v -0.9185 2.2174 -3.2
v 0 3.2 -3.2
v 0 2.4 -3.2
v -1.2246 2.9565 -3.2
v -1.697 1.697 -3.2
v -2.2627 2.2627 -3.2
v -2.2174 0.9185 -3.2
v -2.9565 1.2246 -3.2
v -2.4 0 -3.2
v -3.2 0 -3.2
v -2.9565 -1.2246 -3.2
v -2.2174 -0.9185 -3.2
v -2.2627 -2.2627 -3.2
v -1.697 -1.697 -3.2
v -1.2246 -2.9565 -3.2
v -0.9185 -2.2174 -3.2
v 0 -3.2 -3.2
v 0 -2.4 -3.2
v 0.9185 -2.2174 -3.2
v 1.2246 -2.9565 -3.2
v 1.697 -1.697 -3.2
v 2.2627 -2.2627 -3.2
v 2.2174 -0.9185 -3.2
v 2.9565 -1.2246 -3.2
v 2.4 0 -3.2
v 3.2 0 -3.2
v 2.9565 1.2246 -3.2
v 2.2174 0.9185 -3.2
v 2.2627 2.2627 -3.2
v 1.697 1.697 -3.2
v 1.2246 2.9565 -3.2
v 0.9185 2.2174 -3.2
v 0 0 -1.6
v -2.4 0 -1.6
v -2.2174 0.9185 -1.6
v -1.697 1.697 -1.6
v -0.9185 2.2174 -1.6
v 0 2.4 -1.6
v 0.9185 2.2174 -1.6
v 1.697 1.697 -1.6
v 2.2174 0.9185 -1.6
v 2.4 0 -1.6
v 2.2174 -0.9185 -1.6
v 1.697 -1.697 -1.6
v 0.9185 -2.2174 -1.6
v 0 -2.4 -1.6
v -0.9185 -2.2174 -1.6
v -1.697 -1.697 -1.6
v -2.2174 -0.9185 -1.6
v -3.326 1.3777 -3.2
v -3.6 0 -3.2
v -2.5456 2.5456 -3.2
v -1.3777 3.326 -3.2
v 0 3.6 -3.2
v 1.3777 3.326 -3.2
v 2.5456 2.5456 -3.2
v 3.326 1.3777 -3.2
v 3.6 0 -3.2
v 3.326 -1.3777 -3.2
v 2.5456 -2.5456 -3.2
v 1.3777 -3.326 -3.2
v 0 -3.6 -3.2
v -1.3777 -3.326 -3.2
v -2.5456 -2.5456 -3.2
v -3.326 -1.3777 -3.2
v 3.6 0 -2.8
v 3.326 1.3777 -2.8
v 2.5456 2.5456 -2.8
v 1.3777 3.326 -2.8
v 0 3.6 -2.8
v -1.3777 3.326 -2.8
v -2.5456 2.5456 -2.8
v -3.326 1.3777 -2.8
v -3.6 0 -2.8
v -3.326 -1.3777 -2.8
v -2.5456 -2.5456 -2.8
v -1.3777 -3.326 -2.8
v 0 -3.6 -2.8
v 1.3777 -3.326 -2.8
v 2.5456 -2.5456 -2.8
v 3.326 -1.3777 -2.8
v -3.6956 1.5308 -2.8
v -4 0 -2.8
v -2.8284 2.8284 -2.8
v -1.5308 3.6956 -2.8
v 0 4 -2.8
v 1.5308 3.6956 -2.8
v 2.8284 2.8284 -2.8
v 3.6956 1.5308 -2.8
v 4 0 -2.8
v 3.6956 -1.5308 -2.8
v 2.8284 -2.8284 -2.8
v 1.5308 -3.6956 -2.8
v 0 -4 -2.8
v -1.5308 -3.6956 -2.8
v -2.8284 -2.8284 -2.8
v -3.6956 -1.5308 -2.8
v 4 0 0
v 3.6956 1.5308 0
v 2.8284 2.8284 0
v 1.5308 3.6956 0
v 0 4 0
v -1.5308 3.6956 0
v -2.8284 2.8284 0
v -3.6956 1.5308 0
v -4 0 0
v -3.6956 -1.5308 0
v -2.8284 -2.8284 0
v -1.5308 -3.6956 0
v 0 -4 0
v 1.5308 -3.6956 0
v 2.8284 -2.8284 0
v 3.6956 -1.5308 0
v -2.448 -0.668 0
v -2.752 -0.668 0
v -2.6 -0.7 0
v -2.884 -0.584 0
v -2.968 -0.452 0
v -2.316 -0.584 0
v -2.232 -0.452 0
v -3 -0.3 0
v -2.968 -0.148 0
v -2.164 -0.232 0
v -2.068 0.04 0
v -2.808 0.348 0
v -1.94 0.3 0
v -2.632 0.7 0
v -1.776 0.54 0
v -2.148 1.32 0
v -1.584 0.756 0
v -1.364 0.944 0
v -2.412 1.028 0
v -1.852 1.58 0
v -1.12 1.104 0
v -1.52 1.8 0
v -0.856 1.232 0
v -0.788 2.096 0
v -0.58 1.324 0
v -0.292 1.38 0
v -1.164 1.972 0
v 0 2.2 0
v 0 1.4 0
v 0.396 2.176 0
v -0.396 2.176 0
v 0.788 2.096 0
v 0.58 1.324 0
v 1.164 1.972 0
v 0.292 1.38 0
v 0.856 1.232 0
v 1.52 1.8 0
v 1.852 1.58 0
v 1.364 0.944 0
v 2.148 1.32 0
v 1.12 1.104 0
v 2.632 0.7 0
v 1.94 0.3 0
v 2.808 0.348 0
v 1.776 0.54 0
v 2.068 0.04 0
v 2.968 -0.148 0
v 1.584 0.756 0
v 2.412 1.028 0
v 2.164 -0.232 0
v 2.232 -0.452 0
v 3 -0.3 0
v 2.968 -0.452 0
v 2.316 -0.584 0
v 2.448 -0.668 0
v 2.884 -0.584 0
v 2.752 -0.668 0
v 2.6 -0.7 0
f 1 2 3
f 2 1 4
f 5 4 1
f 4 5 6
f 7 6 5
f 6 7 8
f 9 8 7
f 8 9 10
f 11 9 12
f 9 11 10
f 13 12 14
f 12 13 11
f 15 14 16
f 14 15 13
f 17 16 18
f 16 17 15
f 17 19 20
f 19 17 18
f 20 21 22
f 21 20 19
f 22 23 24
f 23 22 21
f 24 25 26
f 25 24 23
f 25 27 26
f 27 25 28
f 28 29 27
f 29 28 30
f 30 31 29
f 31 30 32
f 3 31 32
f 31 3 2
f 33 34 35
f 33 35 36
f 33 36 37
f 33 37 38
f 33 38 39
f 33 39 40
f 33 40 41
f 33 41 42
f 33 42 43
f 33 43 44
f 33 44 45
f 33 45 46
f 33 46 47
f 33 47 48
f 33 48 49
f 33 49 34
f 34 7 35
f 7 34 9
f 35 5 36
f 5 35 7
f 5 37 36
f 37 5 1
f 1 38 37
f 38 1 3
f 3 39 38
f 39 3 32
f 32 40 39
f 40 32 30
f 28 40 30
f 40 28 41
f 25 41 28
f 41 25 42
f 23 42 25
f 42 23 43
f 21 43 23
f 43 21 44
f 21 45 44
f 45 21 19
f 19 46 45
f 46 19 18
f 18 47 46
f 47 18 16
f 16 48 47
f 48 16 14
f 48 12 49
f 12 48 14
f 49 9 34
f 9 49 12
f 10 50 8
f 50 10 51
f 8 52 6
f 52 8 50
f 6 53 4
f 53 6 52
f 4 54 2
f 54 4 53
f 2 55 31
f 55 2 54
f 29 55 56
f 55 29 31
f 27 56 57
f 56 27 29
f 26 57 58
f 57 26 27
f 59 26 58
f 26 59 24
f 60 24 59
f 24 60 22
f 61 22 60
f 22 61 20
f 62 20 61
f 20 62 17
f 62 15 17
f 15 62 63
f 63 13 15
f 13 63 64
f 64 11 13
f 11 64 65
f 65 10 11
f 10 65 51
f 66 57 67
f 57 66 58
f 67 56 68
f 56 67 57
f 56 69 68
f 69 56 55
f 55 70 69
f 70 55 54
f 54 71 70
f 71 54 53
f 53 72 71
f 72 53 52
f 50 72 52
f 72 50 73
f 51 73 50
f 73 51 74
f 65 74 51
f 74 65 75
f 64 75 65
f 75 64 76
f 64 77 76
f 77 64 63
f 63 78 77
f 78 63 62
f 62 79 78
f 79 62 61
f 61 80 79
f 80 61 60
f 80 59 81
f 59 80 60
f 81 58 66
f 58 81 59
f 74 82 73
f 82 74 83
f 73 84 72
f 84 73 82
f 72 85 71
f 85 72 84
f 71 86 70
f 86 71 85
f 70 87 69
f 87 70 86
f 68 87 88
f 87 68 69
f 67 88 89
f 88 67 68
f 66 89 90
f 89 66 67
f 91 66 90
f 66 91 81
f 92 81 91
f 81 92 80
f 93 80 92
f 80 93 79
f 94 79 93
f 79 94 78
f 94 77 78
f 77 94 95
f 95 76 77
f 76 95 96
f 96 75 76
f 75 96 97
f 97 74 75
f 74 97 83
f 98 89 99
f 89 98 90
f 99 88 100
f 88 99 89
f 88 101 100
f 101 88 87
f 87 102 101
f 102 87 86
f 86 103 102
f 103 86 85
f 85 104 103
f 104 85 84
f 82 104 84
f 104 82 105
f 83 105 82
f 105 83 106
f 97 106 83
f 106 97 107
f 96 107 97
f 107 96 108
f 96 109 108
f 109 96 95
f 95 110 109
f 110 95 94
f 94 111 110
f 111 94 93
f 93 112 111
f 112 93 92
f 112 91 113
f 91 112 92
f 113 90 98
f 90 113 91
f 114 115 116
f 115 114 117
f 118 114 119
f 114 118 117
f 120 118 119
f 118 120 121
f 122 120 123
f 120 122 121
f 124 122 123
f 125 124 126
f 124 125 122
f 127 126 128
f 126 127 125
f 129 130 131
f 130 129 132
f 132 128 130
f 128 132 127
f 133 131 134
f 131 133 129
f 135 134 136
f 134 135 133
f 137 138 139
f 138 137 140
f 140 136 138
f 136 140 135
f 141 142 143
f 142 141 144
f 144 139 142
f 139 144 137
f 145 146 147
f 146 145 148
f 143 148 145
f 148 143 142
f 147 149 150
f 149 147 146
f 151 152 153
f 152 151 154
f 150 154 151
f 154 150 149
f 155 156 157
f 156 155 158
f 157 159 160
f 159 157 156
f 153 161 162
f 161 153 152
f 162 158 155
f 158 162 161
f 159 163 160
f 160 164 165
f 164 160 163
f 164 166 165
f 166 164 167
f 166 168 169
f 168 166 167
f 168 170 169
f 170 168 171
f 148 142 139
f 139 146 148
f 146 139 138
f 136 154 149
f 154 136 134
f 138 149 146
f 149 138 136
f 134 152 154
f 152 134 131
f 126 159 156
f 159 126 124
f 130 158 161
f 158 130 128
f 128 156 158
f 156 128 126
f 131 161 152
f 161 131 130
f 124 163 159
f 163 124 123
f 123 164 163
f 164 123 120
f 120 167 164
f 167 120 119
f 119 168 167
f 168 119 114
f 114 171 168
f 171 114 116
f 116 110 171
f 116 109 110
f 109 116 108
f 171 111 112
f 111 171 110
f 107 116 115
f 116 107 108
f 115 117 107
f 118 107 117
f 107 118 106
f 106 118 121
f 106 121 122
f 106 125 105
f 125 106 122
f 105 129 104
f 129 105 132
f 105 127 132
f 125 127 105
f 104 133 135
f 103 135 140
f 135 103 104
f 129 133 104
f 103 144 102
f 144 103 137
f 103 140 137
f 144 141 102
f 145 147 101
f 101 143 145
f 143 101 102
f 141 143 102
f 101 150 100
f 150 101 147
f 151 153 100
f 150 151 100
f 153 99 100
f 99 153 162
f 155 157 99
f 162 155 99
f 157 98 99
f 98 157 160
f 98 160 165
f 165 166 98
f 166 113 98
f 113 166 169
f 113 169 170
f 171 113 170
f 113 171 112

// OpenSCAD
// file: ../p/4-4disc.scad
use <../lib.scad>
function ldraw_lib__4_4disc() = [
// 0 Disc 1.0
// 0 Name: 4-4disc.dat
// 0 Author: James Jessiman
// 0 !LDRAW_ORG Primitive UPDATE 2002-02
// 0 !LICENSE Licensed under CC BY 2.0 and CC BY 4.0 : see CAreadme.txt
// 
// 0 BFC CERTIFY CCW
  [0,"BFC","CERTIFY"],
  [0,"BFC","CCW"],
// 
// 0 !HISTORY 1998-12-15 [PTadmin] Official Update 1998-10
// 0 !HISTORY 2002-03-23 [sbliss] Added BFC statement
// 0 !HISTORY 2002-04-25 [PTadmin] Official Update 2002-02
// 0 !HISTORY 2007-06-24 [PTadmin] Header formatted for Contributor Agreement
// 0 !HISTORY 2008-07-01 [PTadmin] Official Update 2008-01
// 
// 
// 3 16 0 0 0 1 0 0 0.9239 0 0.3827
  [3,16,0,0,0,1,0,0,0.9239,0,0.3827],
// 3 16 0 0 0 0.9239 0 0.3827 0.7071 0 0.7071
  [3,16,0,0,0,0.9239,0,0.3827,0.7071,0,0.7071],
// 3 16 0 0 0 0.7071 0 0.7071 0.3827 0 0.9239
  [3,16,0,0,0,0.7071,0,0.7071,0.3827,0,0.9239],
// 3 16 0 0 0 0.3827 0 0.9239 0 0 1
  [3,16,0,0,0,0.3827,0,0.9239,0,0,1],
// 3 16 0 0 0 0 0 1 -0.3827 0 0.9239
  [3,16,0,0,0,0,0,1,-0.3827,0,0.9239],
// 3 16 0 0 0 -0.3827 0 0.9239 -0.7071 0 0.7071
  [3,16,0,0,0,-0.3827,0,0.9239,-0.7071,0,0.7071],
// 3 16 0 0 0 -0.7071 0 0.7071 -0.9239 0 0.3827
  [3,16,0,0,0,-0.7071,0,0.7071,-0.9239,0,0.3827],
// 3 16 0 0 0 -0.9239 0 0.3827 -1 0 -0
  [3,16,0,0,0,-0.9239,0,0.3827,-1,0,-0],
// 3 16 0 0 0 -1 0 -0 -0.9239 0 -0.3827
  [3,16,0,0,0,-1,0,-0,-0.9239,0,-0.3827],
// 3 16 0 0 0 -0.9239 0 -0.3827 -0.7071 0 -0.7071
  [3,16,0,0,0,-0.9239,0,-0.3827,-0.7071,0,-0.7071],
// 3 16 0 0 0 -0.7071 0 -0.7071 -0.3827 0 -0.9239
  [3,16,0,0,0,-0.7071,0,-0.7071,-0.3827,0,-0.9239],
// 3 16 0 0 0 -0.3827 0 -0.9239 0 0 -1
  [3,16,0,0,0,-0.3827,0,-0.9239,0,0,-1],
// 3 16 0 0 0 0 0 -1 0.3827 0 -0.9239
  [3,16,0,0,0,0,0,-1,0.3827,0,-0.9239],
// 3 16 0 0 0 0.3827 0 -0.9239 0.7071 0 -0.7071
  [3,16,0,0,0,0.3827,0,-0.9239,0.7071,0,-0.7071],
// 3 16 0 0 0 0.7071 0 -0.7071 0.9239 0 -0.3827
  [3,16,0,0,0,0.7071,0,-0.7071,0.9239,0,-0.3827],
// 3 16 0 0 0 0.9239 0 -0.3827 1 0 0
  [3,16,0,0,0,0.9239,0,-0.3827,1,0,0],
// 0
];
module ldraw_lib__4_4disc(step=0, col=false, unit=2/5, alt=false, line=0.2, solid=!$preview)
    makepoly(ldraw_lib__4_4disc(), step=step, col=col, unit=unit, alt=alt, line=line, solid=solid);
ldraw_lib__4_4disc(line=0.2);
// file: ../p/4-4ring3.scad
use <../lib.scad>
$fa=1; $fs=0.2;
function ldraw_lib__4_4ring3(realsolid=false) = [
// 0 Ring  3 x 1.0
// 0 Name: 4-4ring3.dat
// 0 Author: James Jessiman
// 0 !LDRAW_ORG Primitive UPDATE 2009-01
// 0 !LICENSE Licensed under CC BY 2.0 and CC BY 4.0 : see CAreadme.txt
// 
// 0 BFC CERTIFY CCW
  [0,"BFC","CERTIFY"],
  [0,"BFC","CCW"],
// 
// 0 !HISTORY 1998-12-15 [PTadmin] Official Update 1998-10
// 0 !HISTORY 2002-04-05 [hafhead] Added BFC statement
// 0 !HISTORY 2002-04-25 [PTadmin] Official Update 2002-02
// 0 !HISTORY 2007-06-24 [PTadmin] Header formatted for Contributor Agreement
// 0 !HISTORY 2008-07-01 [PTadmin] Official Update 2008-01
// 0 !HISTORY 2008-08-26 [cwdee] Switch polygon winding and rename
// 0 !HISTORY 2009-05-02 [PTadmin] Official Update 2009-01
// 
// 
// 4 16 -1.5308 0 3.6956 -1.1481 0 2.7717 0 0 3 0 0 4
  [4,16,-1.5308,0,3.6956,-1.1481,0,2.7717,0,0,3,0,0,4],
// 4 16 -2.8284 0 2.8284 -2.1213 0 2.1213 -1.1481 0 2.7717 -1.5308 0 3.6956
  [4,16,-2.8284,0,2.8284,-2.1213,0,2.1213,-1.1481,0,2.7717,-1.5308,0,3.6956],
// 4 16 -3.6956 0 1.5308 -2.7717 0 1.1481 -2.1213 0 2.1213 -2.8284 0 2.8284
  [4,16,-3.6956,0,1.5308,-2.7717,0,1.1481,-2.1213,0,2.1213,-2.8284,0,2.8284],
// 4 16 -4 0 0 -3 0 0 -2.7717 0 1.1481 -3.6956 0 1.5308
  [4,16,-4,0,0,-3,0,0,-2.7717,0,1.1481,-3.6956,0,1.5308],
// 4 16 -3.6956 0 -1.5308 -2.7717 0 -1.1481 -3 0 0 -4 0 0
  [4,16,-3.6956,0,-1.5308,-2.7717,0,-1.1481,-3,0,0,-4,0,0],
// 4 16 -2.8284 0 -2.8284 -2.1213 0 -2.1213 -2.7717 0 -1.1481 -3.6956 0 -1.5308
  [4,16,-2.8284,0,-2.8284,-2.1213,0,-2.1213,-2.7717,0,-1.1481,-3.6956,0,-1.5308],
// 4 16 -1.5308 0 -3.6956 -1.1481 0 -2.7717 -2.1213 0 -2.1213 -2.8284 0 -2.8284
  [4,16,-1.5308,0,-3.6956,-1.1481,0,-2.7717,-2.1213,0,-2.1213,-2.8284,0,-2.8284],
// 4 16 0 0 -4 0 0 -3 -1.1481 0 -2.7717 -1.5308 0 -3.6956
  [4,16,0,0,-4,0,0,-3,-1.1481,0,-2.7717,-1.5308,0,-3.6956],
// 4 16 1.5308 0 -3.6956 1.1481 0 -2.7717 0 0 -3 0 0 -4
  [4,16,1.5308,0,-3.6956,1.1481,0,-2.7717,0,0,-3,0,0,-4],
// 4 16 2.8284 0 -2.8284 2.1213 0 -2.1213 1.1481 0 -2.7717 1.5308 0 -3.6956
  [4,16,2.8284,0,-2.8284,2.1213,0,-2.1213,1.1481,0,-2.7717,1.5308,0,-3.6956],
// 4 16 3.6956 0 -1.5308 2.7717 0 -1.1481 2.1213 0 -2.1213 2.8284 0 -2.8284
  [4,16,3.6956,0,-1.5308,2.7717,0,-1.1481,2.1213,0,-2.1213,2.8284,0,-2.8284],
// 4 16 4 0 0 3 0 0 2.7717 0 -1.1481 3.6956 0 -1.5308
  [4,16,4,0,0,3,0,0,2.7717,0,-1.1481,3.6956,0,-1.5308],
// 4 16 3.6956 0 1.5308 2.7717 0 1.1481 3 0 0 4 0 0
  [4,16,3.6956,0,1.5308,2.7717,0,1.1481,3,0,0,4,0,0],
// 4 16 2.8284 0 2.8284 2.1213 0 2.1213 2.7717 0 1.1481 3.6956 0 1.5308
  [4,16,2.8284,0,2.8284,2.1213,0,2.1213,2.7717,0,1.1481,3.6956,0,1.5308],
// 4 16 1.5308 0 3.6956 1.1481 0 2.7717 2.1213 0 2.1213 2.8284 0 2.8284
  [4,16,1.5308,0,3.6956,1.1481,0,2.7717,2.1213,0,2.1213,2.8284,0,2.8284],
// 4 16 0 0 4 0 0 3 1.1481 0 2.7717 1.5308 0 3.6956
  [4,16,0,0,4,0,0,3,1.1481,0,2.7717,1.5308,0,3.6956],
// 0
];
module ldraw_lib__4_4ring3(step=0, col=false, unit=2/5, alt=false, line=0.2, solid=!$preview)
    makepoly(ldraw_lib__4_4ring3(solid), step=step, col=col, unit=unit, alt=alt, line=line, solid=solid);
ldraw_lib__4_4ring3(line=0.2);
// file: ../p/4-4cylc.scad
use <../lib.scad>
use <4-4cyli.scad>
use <4-4disc.scad>
use <4-4edge.scad>
function ldraw_lib__4_4cylc() = [
// 0 Cylinder Closed 1.0
// 0 Name: 4-4cylc.dat
// 0 Author: Alex Taylor [anathema]
// 0 !LDRAW_ORG Primitive UPDATE 2009-02
// 0 !LICENSE Licensed under CC BY 4.0 : see CAreadme.txt
// 
// 0 BFC CERTIFY CCW
  [0,"BFC","CERTIFY"],
  [0,"BFC","CCW"],
// 
// 0 !HISTORY 2008-12-29 [cwdee] Removed one disc
// 0 !HISTORY 2009-09-03 [PTadmin] Official Update 2009-02
// 
// 
// 1 16 0 0 0 1 0 0 0 1 0 0 0 1 4-4edge.dat
  [1,16,0,0,0,1,0,0,0,1,0,0,0,1, ldraw_lib__4_4edge()],
// 1 16 0 1 0 1 0 0 0 1 0 0 0 1 4-4edge.dat
  [1,16,0,1,0,1,0,0,0,1,0,0,0,1, ldraw_lib__4_4edge()],
// 1 16 0 0 0 1 0 0 0 1 0 0 0 1 4-4disc.dat
  [1,16,0,0,0,1,0,0,0,1,0,0,0,1, ldraw_lib__4_4disc()],
// 1 16 0 0 0 1 0 0 0 1 0 0 0 1 4-4cyli.dat
  [1,16,0,0,0,1,0,0,0,1,0,0,0,1, ldraw_lib__4_4cyli()],
// 0
];
module ldraw_lib__4_4cylc(step=0, col=false, unit=2/5, alt=false, line=0.2, solid=!$preview)
    makepoly(ldraw_lib__4_4cylc(), step=step, col=col, unit=unit, alt=alt, line=line, solid=solid);
ldraw_lib__4_4cylc(line=0.2);
// file: ../p/4-4edge.scad
use <../lib.scad>
function ldraw_lib__4_4edge() = [
// 0 Circle 1.0
// 0 Name: 4-4edge.dat
// 0 Author: James Jessiman
// 0 !LDRAW_ORG Primitive UPDATE 2017-01
// 0 !LICENSE Licensed under CC BY 2.0 and CC BY 4.0 : see CAreadme.txt
// 
// 0 BFC CERTIFY CCW
  [0,"BFC","CERTIFY"],
  [0,"BFC","CCW"],
// 
// 0 !HISTORY 1998-12-15 [PTadmin] Official Update 1998-10
// 0 !HISTORY 2005-12-28 [PTadmin] Official Update 2005-01
// 0 !HISTORY 2007-06-24 [PTadmin] Header formatted for Contributor Agreement
// 0 !HISTORY 2008-07-01 [PTadmin] Official Update 2008-01
// 0 !HISTORY 2017-01-15 [Steffen] BFCed
// 0 !HISTORY 2017-12-30 [PTadmin] Official Update 2017-01
// 
// 
// 2 24 1 0 0 0.9239 0 0.3827
  [2,24,1,0,0,0.9239,0,0.3827],
// 2 24 0.9239 0 0.3827 0.7071 0 0.7071
  [2,24,0.9239,0,0.3827,0.7071,0,0.7071],
// 2 24 0.7071 0 0.7071 0.3827 0 0.9239
  [2,24,0.7071,0,0.7071,0.3827,0,0.9239],
// 2 24 0.3827 0 0.9239 0 0 1
  [2,24,0.3827,0,0.9239,0,0,1],
// 2 24 0 0 1 -0.3827 0 0.9239
  [2,24,0,0,1,-0.3827,0,0.9239],
// 2 24 -0.3827 0 0.9239 -0.7071 0 0.7071
  [2,24,-0.3827,0,0.9239,-0.7071,0,0.7071],
// 2 24 -0.7071 0 0.7071 -0.9239 0 0.3827
  [2,24,-0.7071,0,0.7071,-0.9239,0,0.3827],
// 2 24 -0.9239 0 0.3827 -1 0 -0
  [2,24,-0.9239,0,0.3827,-1,0,-0],
// 2 24 -1 0 -0 -0.9239 0 -0.3827
  [2,24,-1,0,-0,-0.9239,0,-0.3827],
// 2 24 -0.9239 0 -0.3827 -0.7071 0 -0.7071
  [2,24,-0.9239,0,-0.3827,-0.7071,0,-0.7071],
// 2 24 -0.7071 0 -0.7071 -0.3827 0 -0.9239
  [2,24,-0.7071,0,-0.7071,-0.3827,0,-0.9239],
// 2 24 -0.3827 0 -0.9239 0 0 -1
  [2,24,-0.3827,0,-0.9239,0,0,-1],
// 2 24 0 0 -1 0.3827 0 -0.9239
  [2,24,0,0,-1,0.3827,0,-0.9239],
// 2 24 0.3827 0 -0.9239 0.7071 0 -0.7071
  [2,24,0.3827,0,-0.9239,0.7071,0,-0.7071],
// 2 24 0.7071 0 -0.7071 0.9239 0 -0.3827
  [2,24,0.7071,0,-0.7071,0.9239,0,-0.3827],
// 2 24 0.9239 0 -0.3827 1 0 0
  [2,24,0.9239,0,-0.3827,1,0,0],
];
module ldraw_lib__4_4edge(step=0, col=false, unit=2/5, alt=false, line=0.2, solid=!$preview)
    makepoly(ldraw_lib__4_4edge(), step=step, col=col, unit=unit, alt=alt, line=line, solid=solid);
ldraw_lib__4_4edge(line=0.2);
// file: ../p/4-4cyli.scad
use <../lib.scad>
$fa=1; $fs=0.2;
function ldraw_lib__4_4cyli(realsolid=false) = [
// 0 Cylinder 1.0
// 0 Name: 4-4cyli.dat
// 0 Author: James Jessiman
// 0 !LDRAW_ORG Primitive UPDATE 2005-01
// 0 !LICENSE Licensed under CC BY 2.0 and CC BY 4.0 : see CAreadme.txt
// 
// 0 BFC CERTIFY CCW
  [0,"BFC","CERTIFY"],
  [0,"BFC","CCW"],
// 
// 0 !HISTORY 1998-12-15 [PTadmin] Official Update 1998-10
// 0 !HISTORY 2002-03-23 [sbliss] Added BFC statement; merged headers from files in distributions LDraw 0.27 and Complete.
// 0 !HISTORY 2002-04-25 [PTadmin] Official Update 2002-02
// 0 !HISTORY 2004-12-14 [guyvivan] BFC CCW
// 0 !HISTORY 2005-12-28 [PTadmin] Official Update 2005-01
// 0 !HISTORY 2007-06-24 [PTadmin] Header formatted for Contributor Agreement
// 0 !HISTORY 2008-07-01 [PTadmin] Official Update 2008-01
// 
// 
// 4 16 1 1 0 0.9239 1 0.3827 0.9239 0 0.3827 1 0 0
  [4,16,1,1,0,0.9239,1,0.3827,0.9239,0,0.3827,1,0,0],
// 5 24 1 0 0 1 1 0 0.9239 0 0.3827 0.9239 0 -0.3827
  [5,24,1,0,0,1,1,0,0.9239,0,0.3827,0.9239,0,-0.3827],
// 4 16 0.9239 1 0.3827 0.7071 1 0.7071 0.7071 0 0.7071 0.9239 0 0.3827
  [4,16,0.9239,1,0.3827,0.7071,1,0.7071,0.7071,0,0.7071,0.9239,0,0.3827],
// 5 24 0.9239 0 0.3827 0.9239 1 0.3827 0.7071 0 0.7071 1 0 0
  [5,24,0.9239,0,0.3827,0.9239,1,0.3827,0.7071,0,0.7071,1,0,0],
// 4 16 0.7071 1 0.7071 0.3827 1 0.9239 0.3827 0 0.9239 0.7071 0 0.7071
  [4,16,0.7071,1,0.7071,0.3827,1,0.9239,0.3827,0,0.9239,0.7071,0,0.7071],
// 5 24 0.7071 0 0.7071 0.7071 1 0.7071 0.3827 0 0.9239 0.9239 0 0.3827
  [5,24,0.7071,0,0.7071,0.7071,1,0.7071,0.3827,0,0.9239,0.9239,0,0.3827],
// 4 16 0.3827 1 0.9239 0 1 1 0 0 1 0.3827 0 0.9239
  [4,16,0.3827,1,0.9239,0,1,1,0,0,1,0.3827,0,0.9239],
// 5 24 0.3827 0 0.9239 0.3827 1 0.9239 0 0 1 0.7071 0 0.7071
  [5,24,0.3827,0,0.9239,0.3827,1,0.9239,0,0,1,0.7071,0,0.7071],
// 4 16 0 1 1 -0.3827 1 0.9239 -0.3827 0 0.9239 0 0 1
  [4,16,0,1,1,-0.3827,1,0.9239,-0.3827,0,0.9239,0,0,1],
// 5 24 0 0 1 0 1 1 -0.3827 0 0.9239 0.3827 0 0.9239
  [5,24,0,0,1,0,1,1,-0.3827,0,0.9239,0.3827,0,0.9239],
// 4 16 -0.3827 1 0.9239 -0.7071 1 0.7071 -0.7071 0 0.7071 -0.3827 0 0.9239
  [4,16,-0.3827,1,0.9239,-0.7071,1,0.7071,-0.7071,0,0.7071,-0.3827,0,0.9239],
// 5 24 -0.3827 0 0.9239 -0.3827 1 0.9239 -0.7071 0 0.7071 0 0 1
  [5,24,-0.3827,0,0.9239,-0.3827,1,0.9239,-0.7071,0,0.7071,0,0,1],
// 4 16 -0.7071 1 0.7071 -0.9239 1 0.3827 -0.9239 0 0.3827 -0.7071 0 0.7071
  [4,16,-0.7071,1,0.7071,-0.9239,1,0.3827,-0.9239,0,0.3827,-0.7071,0,0.7071],
// 5 24 -0.7071 0 0.7071 -0.7071 1 0.7071 -0.9239 0 0.3827 -0.3827 0 0.9239
  [5,24,-0.7071,0,0.7071,-0.7071,1,0.7071,-0.9239,0,0.3827,-0.3827,0,0.9239],
// 4 16 -0.9239 1 0.3827 -1 1 0 -1 0 0 -0.9239 0 0.3827
  [4,16,-0.9239,1,0.3827,-1,1,0,-1,0,0,-0.9239,0,0.3827],
// 5 24 -0.9239 0 0.3827 -0.9239 1 0.3827 -1 0 0 -0.7071 0 0.7071
  [5,24,-0.9239,0,0.3827,-0.9239,1,0.3827,-1,0,0,-0.7071,0,0.7071],
// 4 16 -1 1 0 -0.9239 1 -0.3827 -0.9239 0 -0.3827 -1 0 0
  [4,16,-1,1,0,-0.9239,1,-0.3827,-0.9239,0,-0.3827,-1,0,0],
// 5 24 -1 0 0 -1 1 0 -0.9239 0 -0.3827 -0.9239 0 0.3827
  [5,24,-1,0,0,-1,1,0,-0.9239,0,-0.3827,-0.9239,0,0.3827],
// 4 16 -0.9239 1 -0.3827 -0.7071 1 -0.7071 -0.7071 0 -0.7071 -0.9239 0 -0.3827
  [4,16,-0.9239,1,-0.3827,-0.7071,1,-0.7071,-0.7071,0,-0.7071,-0.9239,0,-0.3827],
// 5 24 -0.9239 0 -0.3827 -0.9239 1 -0.3827 -0.7071 0 -0.7071 -1 0 0
  [5,24,-0.9239,0,-0.3827,-0.9239,1,-0.3827,-0.7071,0,-0.7071,-1,0,0],
// 4 16 -0.7071 1 -0.7071 -0.3827 1 -0.9239 -0.3827 0 -0.9239 -0.7071 0 -0.7071
  [4,16,-0.7071,1,-0.7071,-0.3827,1,-0.9239,-0.3827,0,-0.9239,-0.7071,0,-0.7071],
// 5 24 -0.7071 0 -0.7071 -0.7071 1 -0.7071 -0.3827 0 -0.9239 -0.9239 0 -0.3827
  [5,24,-0.7071,0,-0.7071,-0.7071,1,-0.7071,-0.3827,0,-0.9239,-0.9239,0,-0.3827],
// 4 16 -0.3827 1 -0.9239 0 1 -1 0 0 -1 -0.3827 0 -0.9239
  [4,16,-0.3827,1,-0.9239,0,1,-1,0,0,-1,-0.3827,0,-0.9239],
// 5 24 -0.3827 0 -0.9239 -0.3827 1 -0.9239 0 0 -1 -0.7071 0 -0.7071
  [5,24,-0.3827,0,-0.9239,-0.3827,1,-0.9239,0,0,-1,-0.7071,0,-0.7071],
// 4 16 0 1 -1 0.3827 1 -0.9239 0.3827 0 -0.9239 0 0 -1
  [4,16,0,1,-1,0.3827,1,-0.9239,0.3827,0,-0.9239,0,0,-1],
// 5 24 0 0 -1 0 1 -1 0.3827 0 -0.9239 -0.3827 0 -0.9239
  [5,24,0,0,-1,0,1,-1,0.3827,0,-0.9239,-0.3827,0,-0.9239],
// 4 16 0.3827 1 -0.9239 0.7071 1 -0.7071 0.7071 0 -0.7071 0.3827 0 -0.9239
  [4,16,0.3827,1,-0.9239,0.7071,1,-0.7071,0.7071,0,-0.7071,0.3827,0,-0.9239],
// 5 24 0.3827 0 -0.9239 0.3827 1 -0.9239 0.7071 0 -0.7071 0 0 -1
  [5,24,0.3827,0,-0.9239,0.3827,1,-0.9239,0.7071,0,-0.7071,0,0,-1],
// 4 16 0.7071 1 -0.7071 0.9239 1 -0.3827 0.9239 0 -0.3827 0.7071 0 -0.7071
  [4,16,0.7071,1,-0.7071,0.9239,1,-0.3827,0.9239,0,-0.3827,0.7071,0,-0.7071],
// 5 24 0.7071 0 -0.7071 0.7071 1 -0.7071 0.9239 0 -0.3827 0.3827 0 -0.9239
  [5,24,0.7071,0,-0.7071,0.7071,1,-0.7071,0.9239,0,-0.3827,0.3827,0,-0.9239],
// 4 16 0.9239 1 -0.3827 1 1 0 1 0 0 0.9239 0 -0.3827
  [4,16,0.9239,1,-0.3827,1,1,0,1,0,0,0.9239,0,-0.3827],
// 5 24 0.9239 0 -0.3827 0.9239 1 -0.3827 1 0 0 0.7071 0 -0.7071
  [5,24,0.9239,0,-0.3827,0.9239,1,-0.3827,1,0,0,0.7071,0,-0.7071],
// 0
];
module ldraw_lib__4_4cyli(step=0, col=false, unit=2/5, alt=false, line=0.2, solid=!$preview)
    makepoly(ldraw_lib__4_4cyli(solid), step=step, col=col, unit=unit, alt=alt, line=line, solid=solid);
ldraw_lib__4_4cyli(line=0.2);
// file: ../p/empty.scad
use <../lib.scad>
function ldraw_lib__empty() = [
// 0 Empty
// 0 Name: empty.dat
// 0 Author: Steffen [Steffen]
// 0 !LDRAW_ORG Primitive UPDATE 2015-01
// 0 !LICENSE Licensed under CC BY 4.0 : see CAreadme.txt
// 
// 0 BFC CERTIFY CCW
  [0,"BFC","CERTIFY"],
  [0,"BFC","CCW"],
// 
// 0 !HISTORY 2015-10-11 [PTadmin] Official Update 2015-01
// 
// 
// 0 // // Tool MLCad cannot handle really empty files. This file is used as a workaround.
// 0 // // It exceptionally contains forbidden non-LDRAW standard syntax to satisfy MLCad until it is fixed OR a different editor has become the de-facto LDRAW standard.
// 0 // // The line being used here is an "impossible" conditional line which never should be visible,
// 0 // // additionally hidden by a syntax explicitly hiding it from displaying.
// 
// 0 // MLCAD HIDE 5 24 0 0 0 0.0001 0 0 0.0001 -0.0001 0 0 0 0
];
module ldraw_lib__empty(step=0, col=false, unit=2/5, alt=false, line=0.2, solid=!$preview)
    makepoly(ldraw_lib__empty(), step=step, col=col, unit=unit, alt=alt, line=line, solid=solid);
ldraw_lib__empty(line=0.2);
// file: ../p/stud4o.scad
use <../lib.scad>
use <4-4cylc.scad>
use <4-4ring3.scad>
function ldraw_lib__stud4o() = [
// 0 Stud Tube Open without Outer Cylinder
// 0 Name: stud4o.dat
// 0 Author: Magnus Forsberg [MagFors]
// 0 !LDRAW_ORG Primitive UPDATE 2011-02
// 0 !LICENSE Licensed under CC BY 4.0 : see CAreadme.txt
// 
// 0 !HELP This stud is a "antistud" to be used like a underside stud,
// 0 !HELP but without the outer cylinder.
// 0 !HELP 1 47 0 0 0 1 0 0 0 1 0 0 0 1 stud4.dat
// 
// 0 BFC CERTIFY CCW
  [0,"BFC","CERTIFY"],
  [0,"BFC","CCW"],
// 
// 0 !HISTORY 2011-12-29 [PTadmin] Official Update 2011-02
// 
// 
// 1 16 0 -4 0 2 0 0 0 1 0 0 0 2 4-4ring3.dat
  [1,16,0,-4,0,2,0,0,0,1,0,0,0,2, ldraw_lib__4_4ring3()],
// 0 BFC INVERTNEXT
  [0,"BFC","INVERTNEXT"],
// 1 16 0 0 0 -6 0 0 0 -4 0 0 0 6 4-4cylc.dat
  [1,16,0,0,0,-6,0,0,0,-4,0,0,0,6, ldraw_lib__4_4cylc()],
];
module ldraw_lib__stud4o(step=0, col=false, unit=2/5, alt=false, line=0.2, solid=!$preview)
    makepoly(ldraw_lib__stud4o(), step=step, col=col, unit=unit, alt=alt, line=line, solid=solid);
ldraw_lib__stud4o(line=0.2);
// file: ../p/4-4ring9.scad
use <../lib.scad>
function ldraw_lib__4_4ring9() = [
// 0 Ring  9 x 1.0
// 0 Name: 4-4ring9.dat
// 0 Author: John Riley [jriley]
// 0 !LDRAW_ORG Primitive UPDATE 2004-02
// 0 !LICENSE Licensed under CC BY 2.0 and CC BY 4.0 : see CAreadme.txt
// 
// 0 BFC CERTIFY CCW
  [0,"BFC","CERTIFY"],
  [0,"BFC","CCW"],
// 
// 0 !HISTORY 2004-04-22 [PTadmin] Official Update 2004-02
// 0 !HISTORY 2007-06-24 [PTadmin] Header formatted for Contributor Agreement
// 0 !HISTORY 2008-07-01 [PTadmin] Official Update 2008-01
// 
// 
// 4 16 9 0 0 10 0 0 9.239 0 3.827 8.3151 0 3.4443
  [4,16,9,0,0,10,0,0,9.239,0,3.827,8.3151,0,3.4443],
// 4 16 8.3151 0 3.4443 9.239 0 3.827 7.071 0 7.071 6.3639 0 6.3639
  [4,16,8.3151,0,3.4443,9.239,0,3.827,7.071,0,7.071,6.3639,0,6.3639],
// 4 16 6.3639 0 6.3639 7.071 0 7.071 3.827 0 9.239 3.4443 0 8.3151
  [4,16,6.3639,0,6.3639,7.071,0,7.071,3.827,0,9.239,3.4443,0,8.3151],
// 4 16 3.4443 0 8.3151 3.827 0 9.239 0 0 10 0 0 9
  [4,16,3.4443,0,8.3151,3.827,0,9.239,0,0,10,0,0,9],
// 4 16 0 0 9 0 0 10 -3.827 0 9.239 -3.4443 0 8.3151
  [4,16,0,0,9,0,0,10,-3.827,0,9.239,-3.4443,0,8.3151],
// 4 16 -3.4443 0 8.3151 -3.827 0 9.239 -7.071 0 7.071 -6.3639 0 6.3639
  [4,16,-3.4443,0,8.3151,-3.827,0,9.239,-7.071,0,7.071,-6.3639,0,6.3639],
// 4 16 -6.3639 0 6.3639 -7.071 0 7.071 -9.239 0 3.827 -8.3151 0 3.4443
  [4,16,-6.3639,0,6.3639,-7.071,0,7.071,-9.239,0,3.827,-8.3151,0,3.4443],
// 4 16 -8.3151 0 3.4443 -9.239 0 3.827 -10 0 0 -9 0 0
  [4,16,-8.3151,0,3.4443,-9.239,0,3.827,-10,0,0,-9,0,0],
// 4 16 -9 0 0 -10 0 0 -9.239 0 -3.827 -8.3151 0 -3.4443
  [4,16,-9,0,0,-10,0,0,-9.239,0,-3.827,-8.3151,0,-3.4443],
// 4 16 -8.3151 0 -3.4443 -9.239 0 -3.827 -7.071 0 -7.071 -6.3639 0 -6.3639
  [4,16,-8.3151,0,-3.4443,-9.239,0,-3.827,-7.071,0,-7.071,-6.3639,0,-6.3639],
// 4 16 -6.3639 0 -6.3639 -7.071 0 -7.071 -3.827 0 -9.239 -3.4443 0 -8.3151
  [4,16,-6.3639,0,-6.3639,-7.071,0,-7.071,-3.827,0,-9.239,-3.4443,0,-8.3151],
// 4 16 -3.4443 0 -8.3151 -3.827 0 -9.239 0 0 -10 0 0 -9
  [4,16,-3.4443,0,-8.3151,-3.827,0,-9.239,0,0,-10,0,0,-9],
// 4 16 0 0 -9 0 0 -10 3.827 0 -9.239 3.4443 0 -8.3151
  [4,16,0,0,-9,0,0,-10,3.827,0,-9.239,3.4443,0,-8.3151],
// 4 16 3.4443 0 -8.3151 3.827 0 -9.239 7.071 0 -7.071 6.3639 0 -6.3639
  [4,16,3.4443,0,-8.3151,3.827,0,-9.239,7.071,0,-7.071,6.3639,0,-6.3639],
// 4 16 6.3639 0 -6.3639 7.071 0 -7.071 9.239 0 -3.827 8.3151 0 -3.4443
  [4,16,6.3639,0,-6.3639,7.071,0,-7.071,9.239,0,-3.827,8.3151,0,-3.4443],
// 4 16 8.3151 0 -3.4443 9.239 0 -3.827 10 0 0 9 0 0
  [4,16,8.3151,0,-3.4443,9.239,0,-3.827,10,0,0,9,0,0],
// 0
];
makepoly(ldraw_lib__4_4ring9(), line=0.2);
// file: ../p/4-4ring8.scad
use <../lib.scad>
function ldraw_lib__4_4ring8() = [
// 0 Ring  8 x 1.0
// 0 Name: 4-4ring8.dat
// 0 Author: Steffen [Steffen]
// 0 !LDRAW_ORG Primitive UPDATE 2012-01
// 0 !LICENSE Licensed under CC BY 4.0 : see CAreadme.txt
// 
// 0 BFC CERTIFY CCW
  [0,"BFC","CERTIFY"],
  [0,"BFC","CCW"],
// 
// 0 !HISTORY 2003-12-19 [PTadmin] Official Update 2003-03
// 0 !HISTORY 2007-06-24 [PTadmin] Header formatted for Contributor Agreement
// 0 !HISTORY 2008-07-01 [PTadmin] Official Update 2008-01
// 0 !HISTORY 2012-02-16 [Philo] Changed to CCW
// 0 !HISTORY 2012-03-30 [PTadmin] Official Update 2012-01
// 
// 
// 4 16 9 0 0 8.3151 0 3.4443 7.3912 0 3.0616 8 0 0
  [4,16,9,0,0,8.3151,0,3.4443,7.3912,0,3.0616,8,0,0],
// 4 16 8.3151 0 3.4443 6.3639 0 6.3639 5.6568 0 5.6568 7.3912 0 3.0616
  [4,16,8.3151,0,3.4443,6.3639,0,6.3639,5.6568,0,5.6568,7.3912,0,3.0616],
// 4 16 6.3639 0 6.3639 3.4443 0 8.3151 3.0616 0 7.3912 5.6568 0 5.6568
  [4,16,6.3639,0,6.3639,3.4443,0,8.3151,3.0616,0,7.3912,5.6568,0,5.6568],
// 4 16 3.4443 0 8.3151 0 0 9 0 0 8 3.0616 0 7.3912
  [4,16,3.4443,0,8.3151,0,0,9,0,0,8,3.0616,0,7.3912],
// 4 16 0 0 9 -3.4443 0 8.3151 -3.0616 0 7.3912 0 0 8
  [4,16,0,0,9,-3.4443,0,8.3151,-3.0616,0,7.3912,0,0,8],
// 4 16 -3.4443 0 8.3151 -6.3639 0 6.3639 -5.6568 0 5.6568 -3.0616 0 7.3912
  [4,16,-3.4443,0,8.3151,-6.3639,0,6.3639,-5.6568,0,5.6568,-3.0616,0,7.3912],
// 4 16 -6.3639 0 6.3639 -8.3151 0 3.4443 -7.3912 0 3.0616 -5.6568 0 5.6568
  [4,16,-6.3639,0,6.3639,-8.3151,0,3.4443,-7.3912,0,3.0616,-5.6568,0,5.6568],
// 4 16 -8.3151 0 3.4443 -9 0 0 -8 0 0 -7.3912 0 3.0616
  [4,16,-8.3151,0,3.4443,-9,0,0,-8,0,0,-7.3912,0,3.0616],
// 4 16 -9 0 0 -8.3151 0 -3.4443 -7.3912 0 -3.0616 -8 0 0
  [4,16,-9,0,0,-8.3151,0,-3.4443,-7.3912,0,-3.0616,-8,0,0],
// 4 16 -8.3151 0 -3.4443 -6.3639 0 -6.3639 -5.6568 0 -5.6568 -7.3912 0 -3.0616
  [4,16,-8.3151,0,-3.4443,-6.3639,0,-6.3639,-5.6568,0,-5.6568,-7.3912,0,-3.0616],
// 4 16 -6.3639 0 -6.3639 -3.4443 0 -8.3151 -3.0616 0 -7.3912 -5.6568 0 -5.6568
  [4,16,-6.3639,0,-6.3639,-3.4443,0,-8.3151,-3.0616,0,-7.3912,-5.6568,0,-5.6568],
// 4 16 -3.4443 0 -8.3151 0 0 -9 0 0 -8 -3.0616 0 -7.3912
  [4,16,-3.4443,0,-8.3151,0,0,-9,0,0,-8,-3.0616,0,-7.3912],
// 4 16 0 0 -9 3.4443 0 -8.3151 3.0616 0 -7.3912 0 0 -8
  [4,16,0,0,-9,3.4443,0,-8.3151,3.0616,0,-7.3912,0,0,-8],
// 4 16 3.4443 0 -8.3151 6.3639 0 -6.3639 5.6568 0 -5.6568 3.0616 0 -7.3912
  [4,16,3.4443,0,-8.3151,6.3639,0,-6.3639,5.6568,0,-5.6568,3.0616,0,-7.3912],
// 4 16 6.3639 0 -6.3639 8.3151 0 -3.4443 7.3912 0 -3.0616 5.6568 0 -5.6568
  [4,16,6.3639,0,-6.3639,8.3151,0,-3.4443,7.3912,0,-3.0616,5.6568,0,-5.6568],
// 4 16 8.3151 0 -3.4443 9 0 0 8 0 0 7.3912 0 -3.0616
  [4,16,8.3151,0,-3.4443,9,0,0,8,0,0,7.3912,0,-3.0616],
];
module ldraw_lib__4_4ring8(step=0, col=false, unit=2/5, alt=false, line=0.2, solid=!$preview)
    makepoly(ldraw_lib__4_4ring8(), step=step, col=col, unit=unit, alt=alt, line=line, solid=solid);
ldraw_lib__4_4ring8(line=0.2);
// file: ../p/4-4cylo.scad
use <../lib.scad>
use <4-4cyli.scad>
use <4-4edge.scad>
function ldraw_lib__4_4cylo() = [
// 0 Cylinder Open 1.0
// 0 Name: 4-4cylo.dat
// 0 Author: Mark Kennedy [mkennedy]
// 0 !LDRAW_ORG Primitive UPDATE 2010-01
// 0 !LICENSE Licensed under CC BY 2.0 and CC BY 4.0 : see CAreadme.txt
// 
// 0 BFC CERTIFY CCW
  [0,"BFC","CERTIFY"],
  [0,"BFC","CCW"],
// 
// 0 !HISTORY 2010-04-05 [PTadmin] Official Update 2010-01
// 
// 
// 1 16 0 0 0 1 0 0 0 1 0 0 0 1 4-4edge.dat
  [1,16,0,0,0,1,0,0,0,1,0,0,0,1, ldraw_lib__4_4edge()],
// 1 16 0 1 0 1 0 0 0 1 0 0 0 1 4-4edge.dat
  [1,16,0,1,0,1,0,0,0,1,0,0,0,1, ldraw_lib__4_4edge()],
// 1 16 0 0 0 1 0 0 0 1 0 0 0 1 4-4cyli.dat
  [1,16,0,0,0,1,0,0,0,1,0,0,0,1, ldraw_lib__4_4cyli()],
// 0
];
makepoly(ldraw_lib__4_4cylo(), line=0.2);
// file: ../p/1-16chrd.scad
use <../lib.scad>
use <empty.scad>
$fa=1; $fs=0.2;
function ldraw_lib__1_16chrd(realsolid=false) = [
// 0 Chord 0.0625
// 0 Name: 1-16chrd.dat
// 0 Author: Philippe Hurbain [Philo]
// 0 !LDRAW_ORG Primitive UPDATE 2015-01
// 0 !LICENSE Licensed under CC BY 2.0 and CC BY 4.0 : see CAreadme.txt
// 
// 0 BFC CERTIFY CCW
  [0,"BFC","CERTIFY"],
  [0,"BFC","CCW"],
// 
// 0 !HISTORY 2015-10-11 [PTadmin] Official Update 2015-01
// 
// 
// 0 // This file is intentionally empty because at the current \P resolution,
// 0 // an 1-16chrd is actually empty. However, this file still is present
// 0 // to allow tools to do primitives substition and fill in a real chrd here,
// 0 // or, if desired, to substitute this with the hi-res 48\1-16chrd.
// 
// 0 // This file is based on an idea by Darats at http://forums.ldraw.org/read.php?19,14500,14500#msg-14500
// 
// 1 16 0 0 0 1 0 0 0 1 0 0 0 1 empty.dat
  [1,16,0,0,0,1,0,0,0,1,0,0,0,1, ldraw_lib__empty(realsolid)],
];
module ldraw_lib__1_16chrd(step=0, col=false, unit=2/5, alt=false, line=0.2, solid=!$preview)
    makepoly(ldraw_lib__1_16chrd(solid), step=step, col=col, unit=unit, alt=alt, line=line, solid=solid);
ldraw_lib__1_16chrd(line=0.2);
// file: s/98138s02.scad
use <../../lib.scad>
use <../../p/4-4cylo.scad>
use <../../p/4-4ring8.scad>
use <../../p/4-4ring9.scad>
use <../../p/stud4o.scad>
function ldraw_lib__s__98138s02() = [
// 0 ~Tile  1 x  1 Round with Groove without Complete Top Face
// 0 Name: s\98138s02.dat
// 0 Author: Magnus Forsberg [MagFors]
// 0 !LDRAW_ORG Subpart UPDATE 2020-01
// 0 !LICENSE Licensed under CC BY 2.0 and CC BY 4.0 : see CAreadme.txt
// 
// 0 BFC CERTIFY CCW
  [0,"BFC","CERTIFY"],
  [0,"BFC","CCW"],
// 
// 0 !HISTORY 2020-06-28 [PTadmin] Official Update 2020-01
// 
// 
// 1 16 0 4 0 1 0 0 0 -1 0 0 0 1 stud4o.dat
  [1,16,0,4,0,1,0,0,0,-1,0,0,0,1, ldraw_lib__stud4o()],
// 1 16 0 8 0 -1 0 0 0 -1 0 0 0 1 4-4ring8.dat
  [1,16,0,8,0,-1,0,0,0,-1,0,0,0,1, ldraw_lib__4_4ring8()],
// 1 16 0 7 0 9 0 0 0 1 0 0 0 9 4-4cylo.dat
  [1,16,0,7,0,9,0,0,0,1,0,0,0,9, ldraw_lib__4_4cylo()],
// 1 16 0 7 0 -1 0 0 0 -1 0 0 0 1 4-4ring9.dat
  [1,16,0,7,0,-1,0,0,0,-1,0,0,0,1, ldraw_lib__4_4ring9()],
// 1 16 0 0 0 10 0 0 0 7 0 0 0 10 4-4cylo.dat
  [1,16,0,0,0,10,0,0,0,7,0,0,0,10, ldraw_lib__4_4cylo()],
];
module ldraw_lib__s__98138s02(step=0, col=false, unit=2/5, alt=false, line=0.2, solid=!$preview)
    makepoly(ldraw_lib__s__98138s02(), step=step, col=col, unit=unit, alt=alt, line=line, solid=solid);
ldraw_lib__s__98138s02(line=0.2);
// file: ../p/4-4ering.scad
use <../lib.scad>
use <1-16chrd.scad>
function ldraw_lib__4_4ering() = [
// 0 Adapter Ring Triangles to Normal 1.0
// 0 Name: 4-4ering.dat
// 0 Author: Philippe Hurbain [Philo]
// 0 !LDRAW_ORG Primitive UPDATE 2015-01
// 0 !LICENSE Licensed under CC BY 2.0 and CC BY 4.0 : see CAreadme.txt
// 
// 0 BFC CERTIFY CCW
  [0,"BFC","CERTIFY"],
  [0,"BFC","CCW"],
// 
// 0 !HISTORY 2015-10-11 [PTadmin] Official Update 2015-01
// 
// 
// 0 // This file uses 1-16chrd (actually empty). It allows
// 0 // tools to do primitives substition and fill in a ring of chrd here,
// 0 // or, if desired, to substitute this with the hi-res 48\1-16chrd.
// 0 // This file is based on an idea by Darats at http://forums.ldraw.org/read.php?19,14500,14500#msg-14500
// 
// 1 16 0 0 0 1 0 0 0 1 0 0 0 1 1-16chrd.dat
  [1,16,0,0,0,1,0,0,0,1,0,0,0,1, ldraw_lib__1_16chrd()],
// 1 16 0 0 0 0.92388 0 0.38268 0 1 0 -0.38268 0 0.92388 1-16chrd.dat
  [1,16,0,0,0,0.92388,0,0.38268,0,1,0,-0.38268,0,0.92388, ldraw_lib__1_16chrd()],
// 1 16 0 0 0 0.70711 0 0.70711 0 1 0 -0.70711 0 0.70711 1-16chrd.dat
  [1,16,0,0,0,0.70711,0,0.70711,0,1,0,-0.70711,0,0.70711, ldraw_lib__1_16chrd()],
// 1 16 0 0 0 0.38268 0 0.92388 0 1 0 -0.92388 0 0.38268 1-16chrd.dat
  [1,16,0,0,0,0.38268,0,0.92388,0,1,0,-0.92388,0,0.38268, ldraw_lib__1_16chrd()],
// 1 16 0 0 0 0 0 1 0 1 0 -1 0 0 1-16chrd.dat
  [1,16,0,0,0,0,0,1,0,1,0,-1,0,0, ldraw_lib__1_16chrd()],
// 1 16 0 0 0 -0.38268 0 0.92388 0 1 0 -0.92388 0 -0.38268 1-16chrd.dat
  [1,16,0,0,0,-0.38268,0,0.92388,0,1,0,-0.92388,0,-0.38268, ldraw_lib__1_16chrd()],
// 1 16 0 0 0 -0.70711 0 0.70711 0 1 0 -0.70711 0 -0.70711 1-16chrd.dat
  [1,16,0,0,0,-0.70711,0,0.70711,0,1,0,-0.70711,0,-0.70711, ldraw_lib__1_16chrd()],
// 1 16 0 0 0 -0.92388 0 0.38268 0 1 0 -0.38268 0 -0.92388 1-16chrd.dat
  [1,16,0,0,0,-0.92388,0,0.38268,0,1,0,-0.38268,0,-0.92388, ldraw_lib__1_16chrd()],
// 1 16 0 0 0 0 0 -1 0 1 0 1 0 0 1-16chrd.dat
  [1,16,0,0,0,0,0,-1,0,1,0,1,0,0, ldraw_lib__1_16chrd()],
// 1 16 0 0 0 0.38268 0 -0.92388 0 1 0 0.92388 0 0.38268 1-16chrd.dat
  [1,16,0,0,0,0.38268,0,-0.92388,0,1,0,0.92388,0,0.38268, ldraw_lib__1_16chrd()],
// 1 16 0 0 0 0.70711 0 -0.70711 0 1 0 0.70711 0 0.70711 1-16chrd.dat
  [1,16,0,0,0,0.70711,0,-0.70711,0,1,0,0.70711,0,0.70711, ldraw_lib__1_16chrd()],
// 1 16 0 0 0 0.92388 0 -0.38268 0 1 0 0.38268 0 0.92388 1-16chrd.dat
  [1,16,0,0,0,0.92388,0,-0.38268,0,1,0,0.38268,0,0.92388, ldraw_lib__1_16chrd()],
// 1 16 0 0 0 -1 0 0 0 1 0 0 0 -1 1-16chrd.dat
  [1,16,0,0,0,-1,0,0,0,1,0,0,0,-1, ldraw_lib__1_16chrd()],
// 1 16 0 0 0 -0.92388 0 -0.38268 0 1 0 0.38268 0 -0.92388 1-16chrd.dat
  [1,16,0,0,0,-0.92388,0,-0.38268,0,1,0,0.38268,0,-0.92388, ldraw_lib__1_16chrd()],
// 1 16 0 0 0 -0.70711 0 -0.70711 0 1 0 0.70711 0 -0.70711 1-16chrd.dat
  [1,16,0,0,0,-0.70711,0,-0.70711,0,1,0,0.70711,0,-0.70711, ldraw_lib__1_16chrd()],
// 1 16 0 0 0 -0.38268 0 -0.92388 0 1 0 0.92388 0 -0.38268 1-16chrd.dat
  [1,16,0,0,0,-0.38268,0,-0.92388,0,1,0,0.92388,0,-0.38268, ldraw_lib__1_16chrd()],
];
makepoly(ldraw_lib__4_4ering(), line=0.2);
// main file
use <../lib.scad>
use <../p/4-4ering.scad>
use <s/98138s02.scad>
function ldraw_lib__98138p2n() = [
// 0 Tile  1 x  1 Round with Black Curved Line Pattern
// 0 Name: 98138p2n.dat
// 0 Author: Vincent Messenet [Cheenzo]
// 0 !LDRAW_ORG Part UPDATE 2023-05
// 0 !LICENSE Licensed under CC BY 4.0 : see CAreadme.txt
// 
// 0 BFC CERTIFY CCW
  [0,"BFC","CERTIFY"],
  [0,"BFC","CCW"],
// 
// 0 !KEYWORDS Bricklink 98138pb364, BrickOwl 361242, Eye, Mouth
// 0 !KEYWORDS Rebrickable 98138pr9977, Set 11027, Set 11028, Set 11031, Set 11033
// 0 !KEYWORDS smile
// 
// 0 !HISTORY 2023-10-31 [OrionP] Official Update 2023-05
// 
// 
// 1 16 0 0 0 1 0 0 0 1 0 0 0 1 s\98138s02.dat
  [1,16,0,0,0,1,0,0,0,1,0,0,0,1, ldraw_lib__s__98138s02()],
// 1 16 0 0 0 10 0 0 0 1 0 0 0 10 4-4ering.dat
  [1,16,0,0,0,10,0,0,0,1,0,0,0,10, ldraw_lib__4_4ering()],
// 
// 4 0 -7.21 0 -1.46 -6.88 0 -1.67 -6.5 0 -1.75 -6.12 0 -1.67
  [4,0,-7.21,0,-1.46,-6.88,0,-1.67,-6.5,0,-1.75,-6.12,0,-1.67],
// 4 0 -7.21 0 -1.46 -6.12 0 -1.67 -5.79 0 -1.46 -7.42 0 -1.13
  [4,0,-7.21,0,-1.46,-6.12,0,-1.67,-5.79,0,-1.46,-7.42,0,-1.13],
// 4 0 -7.42 0 -1.13 -5.79 0 -1.46 -5.58 0 -1.13 -7.5 0 -.75
  [4,0,-7.42,0,-1.13,-5.79,0,-1.46,-5.58,0,-1.13,-7.5,0,-.75],
// 4 0 -7.42 0 -.37 -7.5 0 -.75 -5.58 0 -1.13 -5.41 0 -.58
  [4,0,-7.42,0,-.37,-7.5,0,-.75,-5.58,0,-1.13,-5.41,0,-.58],
// 3 0 -5.17 0 .1 -7.42 0 -.37 -5.41 0 -.58
  [3,0,-5.17,0,.1,-7.42,0,-.37,-5.41,0,-.58],
// 4 0 -4.85 0 .75 -7.02 0 .87 -7.42 0 -.37 -5.17 0 .1
  [4,0,-4.85,0,.75,-7.02,0,.87,-7.42,0,-.37,-5.17,0,.1],
// 4 0 -4.44 0 1.35 -6.58 0 1.75 -7.02 0 .87 -4.85 0 .75
  [4,0,-4.44,0,1.35,-6.58,0,1.75,-7.02,0,.87,-4.85,0,.75],
// 4 0 -3.41 0 2.36 -5.37 0 3.3 -6.03 0 2.57 -3.96 0 1.89
  [4,0,-3.41,0,2.36,-5.37,0,3.3,-6.03,0,2.57,-3.96,0,1.89],
// 4 0 -6.58 0 1.75 -4.44 0 1.35 -3.96 0 1.89 -6.03 0 2.57
  [4,0,-6.58,0,1.75,-4.44,0,1.35,-3.96,0,1.89,-6.03,0,2.57],
// 4 0 -5.37 0 3.3 -3.41 0 2.36 -2.8 0 2.76 -4.63 0 3.95
  [4,0,-5.37,0,3.3,-3.41,0,2.36,-2.8,0,2.76,-4.63,0,3.95],
// 4 0 -4.63 0 3.95 -2.8 0 2.76 -2.14 0 3.08 -3.8 0 4.5
  [4,0,-4.63,0,3.95,-2.8,0,2.76,-2.14,0,3.08,-3.8,0,4.5],
// 4 0 -.73 0 3.45 -1.97 0 5.24 -2.91 0 4.93 -1.45 0 3.31
  [4,0,-.73,0,3.45,-1.97,0,5.24,-2.91,0,4.93,-1.45,0,3.31],
// 4 0 -3.8 0 4.5 -2.14 0 3.08 -1.45 0 3.31 -2.91 0 4.93
  [4,0,-3.8,0,4.5,-2.14,0,3.08,-1.45,0,3.31,-2.91,0,4.93],
// 4 0 .99 0 5.44 0 0 5.5 -.99 0 5.44 0 0 3.5
  [4,0,.99,0,5.44,0,0,5.5,-.99,0,5.44,0,0,3.5],
// 4 0 -1.97 0 5.24 -.73 0 3.45 0 0 3.5 -.99 0 5.44
  [4,0,-1.97,0,5.24,-.73,0,3.45,0,0,3.5,-.99,0,5.44],
// 4 0 1.45 0 3.31 2.91 0 4.93 1.97 0 5.24 .73 0 3.45
  [4,0,1.45,0,3.31,2.91,0,4.93,1.97,0,5.24,.73,0,3.45],
// 4 0 .99 0 5.44 0 0 3.5 .73 0 3.45 1.97 0 5.24
  [4,0,.99,0,5.44,0,0,3.5,.73,0,3.45,1.97,0,5.24],
// 4 0 1.45 0 3.31 2.14 0 3.08 3.8 0 4.5 2.91 0 4.93
  [4,0,1.45,0,3.31,2.14,0,3.08,3.8,0,4.5,2.91,0,4.93],
// 4 0 5.37 0 3.3 4.63 0 3.95 2.8 0 2.76 3.41 0 2.36
  [4,0,5.37,0,3.3,4.63,0,3.95,2.8,0,2.76,3.41,0,2.36],
// 4 0 2.14 0 3.08 2.8 0 2.76 4.63 0 3.95 3.8 0 4.5
  [4,0,2.14,0,3.08,2.8,0,2.76,4.63,0,3.95,3.8,0,4.5],
// 4 0 4.85 0 .75 7.02 0 .87 6.58 0 1.75 4.44 0 1.35
  [4,0,4.85,0,.75,7.02,0,.87,6.58,0,1.75,4.44,0,1.35],
// 4 0 7.42 0 -.37 7.02 0 .87 4.85 0 .75 5.17 0 .1
  [4,0,7.42,0,-.37,7.02,0,.87,4.85,0,.75,5.17,0,.1],
// 4 0 3.41 0 2.36 3.96 0 1.89 6.03 0 2.57 5.37 0 3.3
  [4,0,3.41,0,2.36,3.96,0,1.89,6.03,0,2.57,5.37,0,3.3],
// 4 0 4.44 0 1.35 6.58 0 1.75 6.03 0 2.57 3.96 0 1.89
  [4,0,4.44,0,1.35,6.58,0,1.75,6.03,0,2.57,3.96,0,1.89],
// 3 0 5.17 0 .1 5.41 0 -.58 7.42 0 -.37
  [3,0,5.17,0,.1,5.41,0,-.58,7.42,0,-.37],
// 4 0 7.42 0 -.37 5.41 0 -.58 5.58 0 -1.13 7.5 0 -.75
  [4,0,7.42,0,-.37,5.41,0,-.58,5.58,0,-1.13,7.5,0,-.75],
// 4 0 7.5 0 -.75 5.58 0 -1.13 5.79 0 -1.46 7.42 0 -1.13
  [4,0,7.5,0,-.75,5.58,0,-1.13,5.79,0,-1.46,7.42,0,-1.13],
// 4 0 7.42 0 -1.13 5.79 0 -1.46 6.12 0 -1.67 7.21 0 -1.46
  [4,0,7.42,0,-1.13,5.79,0,-1.46,6.12,0,-1.67,7.21,0,-1.46],
// 4 0 7.21 0 -1.46 6.12 0 -1.67 6.5 0 -1.75 6.88 0 -1.67
  [4,0,7.21,0,-1.46,6.12,0,-1.67,6.5,0,-1.75,6.88,0,-1.67],
// 3 16 .73 0 3.45 0 0 3.5 -.73 0 3.45
  [3,16,.73,0,3.45,0,0,3.5,-.73,0,3.45],
// 4 16 -1.45 0 3.31 1.45 0 3.31 .73 0 3.45 -.73 0 3.45
  [4,16,-1.45,0,3.31,1.45,0,3.31,.73,0,3.45,-.73,0,3.45],
// 4 16 -2.8 0 2.76 2.8 0 2.76 2.14 0 3.08 -2.14 0 3.08
  [4,16,-2.8,0,2.76,2.8,0,2.76,2.14,0,3.08,-2.14,0,3.08],
// 4 16 1.45 0 3.31 -1.45 0 3.31 -2.14 0 3.08 2.14 0 3.08
  [4,16,1.45,0,3.31,-1.45,0,3.31,-2.14,0,3.08,2.14,0,3.08],
// 4 16 -3.41 0 2.36 3.41 0 2.36 2.8 0 2.76 -2.8 0 2.76
  [4,16,-3.41,0,2.36,3.41,0,2.36,2.8,0,2.76,-2.8,0,2.76],
// 4 16 4.85 0 .75 -4.85 0 .75 -5.17 0 .1 5.17 0 .1
  [4,16,4.85,0,.75,-4.85,0,.75,-5.17,0,.1,5.17,0,.1],
// 4 16 -3.96 0 1.89 -4.44 0 1.35 4.44 0 1.35 3.96 0 1.89
  [4,16,-3.96,0,1.89,-4.44,0,1.35,4.44,0,1.35,3.96,0,1.89],
// 4 16 -4.85 0 .75 4.85 0 .75 4.44 0 1.35 -4.44 0 1.35
  [4,16,-4.85,0,.75,4.85,0,.75,4.44,0,1.35,-4.44,0,1.35],
// 4 16 3.41 0 2.36 -3.41 0 2.36 -3.96 0 1.89 3.96 0 1.89
  [4,16,3.41,0,2.36,-3.41,0,2.36,-3.96,0,1.89,3.96,0,1.89],
// 4 16 5.41 0 -.58 5.17 0 .1 -5.17 0 .1 -5.41 0 -.58
  [4,16,5.41,0,-.58,5.17,0,.1,-5.17,0,.1,-5.41,0,-.58],
// 4 16 5.41 0 -.58 -5.41 0 -.58 -5.58 0 -1.13 5.58 0 -1.13
  [4,16,5.41,0,-.58,-5.41,0,-.58,-5.58,0,-1.13,5.58,0,-1.13],
// 4 16 5.79 0 -1.46 5.58 0 -1.13 -5.58 0 -1.13 -5.79 0 -1.46
  [4,16,5.79,0,-1.46,5.58,0,-1.13,-5.58,0,-1.13,-5.79,0,-1.46],
// 4 16 5.79 0 -1.46 -5.79 0 -1.46 -6.12 0 -1.67 6.12 0 -1.67
  [4,16,5.79,0,-1.46,-5.79,0,-1.46,-6.12,0,-1.67,6.12,0,-1.67],
// 4 16 6.12 0 -1.67 -6.12 0 -1.67 -6.5 0 -1.75 6.5 0 -1.75
  [4,16,6.12,0,-1.67,-6.12,0,-1.67,-6.5,0,-1.75,6.5,0,-1.75],
// 3 16 -6.5 0 -1.75 0 0 -10 6.5 0 -1.75
  [3,16,-6.5,0,-1.75,0,0,-10,6.5,0,-1.75],
// 4 16 -7.071 0 -7.071 -3.827 0 -9.239 0 0 -10 -6.5 0 -1.75
  [4,16,-7.071,0,-7.071,-3.827,0,-9.239,0,0,-10,-6.5,0,-1.75],
// 4 16 0 0 -10 3.827 0 -9.239 7.071 0 -7.071 6.5 0 -1.75
  [4,16,0,0,-10,3.827,0,-9.239,7.071,0,-7.071,6.5,0,-1.75],
// 4 16 -9.239 0 -3.827 -7.071 0 -7.071 -6.5 0 -1.75 -6.88 0 -1.67
  [4,16,-9.239,0,-3.827,-7.071,0,-7.071,-6.5,0,-1.75,-6.88,0,-1.67],
// 3 16 -6.88 0 -1.67 -7.21 0 -1.46 -9.239 0 -3.827
  [3,16,-6.88,0,-1.67,-7.21,0,-1.46,-9.239,0,-3.827],
// 4 16 -7.21 0 -1.46 -7.42 0 -1.13 -10 0 0 -9.239 0 -3.827
  [4,16,-7.21,0,-1.46,-7.42,0,-1.13,-10,0,0,-9.239,0,-3.827],
// 3 16 -10 0 0 -7.42 0 -1.13 -7.5 0 -.75
  [3,16,-10,0,0,-7.42,0,-1.13,-7.5,0,-.75],
// 3 16 -10 0 0 -7.5 0 -.75 -7.42 0 -.37
  [3,16,-10,0,0,-7.5,0,-.75,-7.42,0,-.37],
// 4 16 -10 0 0 -7.42 0 -.37 -7.02 0 .87 -9.239 0 3.827
  [4,16,-10,0,0,-7.42,0,-.37,-7.02,0,.87,-9.239,0,3.827],
// 4 16 -9.239 0 3.827 -6.03 0 2.57 -5.37 0 3.3 -7.071 0 7.071
  [4,16,-9.239,0,3.827,-6.03,0,2.57,-5.37,0,3.3,-7.071,0,7.071],
// 3 16 -9.239 0 3.827 -6.58 0 1.75 -6.03 0 2.57
  [3,16,-9.239,0,3.827,-6.58,0,1.75,-6.03,0,2.57],
// 3 16 -7.02 0 .87 -6.58 0 1.75 -9.239 0 3.827
  [3,16,-7.02,0,.87,-6.58,0,1.75,-9.239,0,3.827],
// 3 16 -7.071 0 7.071 -4.63 0 3.95 -3.8 0 4.5
  [3,16,-7.071,0,7.071,-4.63,0,3.95,-3.8,0,4.5],
// 4 16 -7.071 0 7.071 -3.8 0 4.5 -2.91 0 4.93 -3.827 0 9.239
  [4,16,-7.071,0,7.071,-3.8,0,4.5,-2.91,0,4.93,-3.827,0,9.239],
// 3 16 -5.37 0 3.3 -4.63 0 3.95 -7.071 0 7.071
  [3,16,-5.37,0,3.3,-4.63,0,3.95,-7.071,0,7.071],
// 4 16 -.99 0 5.44 0 0 10 -3.827 0 9.239 -1.97 0 5.24
  [4,16,-.99,0,5.44,0,0,10,-3.827,0,9.239,-1.97,0,5.24],
// 3 16 -3.827 0 9.239 -2.91 0 4.93 -1.97 0 5.24
  [3,16,-3.827,0,9.239,-2.91,0,4.93,-1.97,0,5.24],
// 3 16 -.99 0 5.44 0 0 5.5 0 0 10
  [3,16,-.99,0,5.44,0,0,5.5,0,0,10],
// 3 16 1.97 0 5.24 2.91 0 4.93 3.827 0 9.239
  [3,16,1.97,0,5.24,2.91,0,4.93,3.827,0,9.239],
// 4 16 0 0 10 .99 0 5.44 1.97 0 5.24 3.827 0 9.239
  [4,16,0,0,10,.99,0,5.44,1.97,0,5.24,3.827,0,9.239],
// 3 16 0 0 5.5 .99 0 5.44 0 0 10
  [3,16,0,0,5.5,.99,0,5.44,0,0,10],
// 4 16 2.91 0 4.93 3.8 0 4.5 7.071 0 7.071 3.827 0 9.239
  [4,16,2.91,0,4.93,3.8,0,4.5,7.071,0,7.071,3.827,0,9.239],
// 3 16 4.63 0 3.95 5.37 0 3.3 7.071 0 7.071
  [3,16,4.63,0,3.95,5.37,0,3.3,7.071,0,7.071],
// 3 16 3.8 0 4.5 4.63 0 3.95 7.071 0 7.071
  [3,16,3.8,0,4.5,4.63,0,3.95,7.071,0,7.071],
// 4 16 5.37 0 3.3 6.03 0 2.57 9.239 0 3.827 7.071 0 7.071
  [4,16,5.37,0,3.3,6.03,0,2.57,9.239,0,3.827,7.071,0,7.071],
// 3 16 6.58 0 1.75 7.02 0 .87 9.239 0 3.827
  [3,16,6.58,0,1.75,7.02,0,.87,9.239,0,3.827],
// 3 16 6.03 0 2.57 6.58 0 1.75 9.239 0 3.827
  [3,16,6.03,0,2.57,6.58,0,1.75,9.239,0,3.827],
// 4 16 10 0 0 9.239 0 3.827 7.02 0 .87 7.42 0 -.37
  [4,16,10,0,0,9.239,0,3.827,7.02,0,.87,7.42,0,-.37],
// 3 16 10 0 0 7.42 0 -.37 7.5 0 -.75
  [3,16,10,0,0,7.42,0,-.37,7.5,0,-.75],
// 3 16 7.5 0 -.75 7.42 0 -1.13 10 0 0
  [3,16,7.5,0,-.75,7.42,0,-1.13,10,0,0],
// 4 16 10 0 0 7.42 0 -1.13 7.21 0 -1.46 9.239 0 -3.827
  [4,16,10,0,0,7.42,0,-1.13,7.21,0,-1.46,9.239,0,-3.827],
// 3 16 9.239 0 -3.827 7.21 0 -1.46 6.88 0 -1.67
  [3,16,9.239,0,-3.827,7.21,0,-1.46,6.88,0,-1.67],
// 4 16 9.239 0 -3.827 6.88 0 -1.67 6.5 0 -1.75 7.071 0 -7.071
  [4,16,9.239,0,-3.827,6.88,0,-1.67,6.5,0,-1.75,7.071,0,-7.071],
];
module ldraw_lib__98138p2n(step=0, col=false, unit=2/5, alt=false, line=0.2, solid=!$preview)
    makepoly(ldraw_lib__98138p2n(), step=step, col=col, unit=unit, alt=alt, line=line, solid=solid);
ldraw_lib__98138p2n(line=0.2);
